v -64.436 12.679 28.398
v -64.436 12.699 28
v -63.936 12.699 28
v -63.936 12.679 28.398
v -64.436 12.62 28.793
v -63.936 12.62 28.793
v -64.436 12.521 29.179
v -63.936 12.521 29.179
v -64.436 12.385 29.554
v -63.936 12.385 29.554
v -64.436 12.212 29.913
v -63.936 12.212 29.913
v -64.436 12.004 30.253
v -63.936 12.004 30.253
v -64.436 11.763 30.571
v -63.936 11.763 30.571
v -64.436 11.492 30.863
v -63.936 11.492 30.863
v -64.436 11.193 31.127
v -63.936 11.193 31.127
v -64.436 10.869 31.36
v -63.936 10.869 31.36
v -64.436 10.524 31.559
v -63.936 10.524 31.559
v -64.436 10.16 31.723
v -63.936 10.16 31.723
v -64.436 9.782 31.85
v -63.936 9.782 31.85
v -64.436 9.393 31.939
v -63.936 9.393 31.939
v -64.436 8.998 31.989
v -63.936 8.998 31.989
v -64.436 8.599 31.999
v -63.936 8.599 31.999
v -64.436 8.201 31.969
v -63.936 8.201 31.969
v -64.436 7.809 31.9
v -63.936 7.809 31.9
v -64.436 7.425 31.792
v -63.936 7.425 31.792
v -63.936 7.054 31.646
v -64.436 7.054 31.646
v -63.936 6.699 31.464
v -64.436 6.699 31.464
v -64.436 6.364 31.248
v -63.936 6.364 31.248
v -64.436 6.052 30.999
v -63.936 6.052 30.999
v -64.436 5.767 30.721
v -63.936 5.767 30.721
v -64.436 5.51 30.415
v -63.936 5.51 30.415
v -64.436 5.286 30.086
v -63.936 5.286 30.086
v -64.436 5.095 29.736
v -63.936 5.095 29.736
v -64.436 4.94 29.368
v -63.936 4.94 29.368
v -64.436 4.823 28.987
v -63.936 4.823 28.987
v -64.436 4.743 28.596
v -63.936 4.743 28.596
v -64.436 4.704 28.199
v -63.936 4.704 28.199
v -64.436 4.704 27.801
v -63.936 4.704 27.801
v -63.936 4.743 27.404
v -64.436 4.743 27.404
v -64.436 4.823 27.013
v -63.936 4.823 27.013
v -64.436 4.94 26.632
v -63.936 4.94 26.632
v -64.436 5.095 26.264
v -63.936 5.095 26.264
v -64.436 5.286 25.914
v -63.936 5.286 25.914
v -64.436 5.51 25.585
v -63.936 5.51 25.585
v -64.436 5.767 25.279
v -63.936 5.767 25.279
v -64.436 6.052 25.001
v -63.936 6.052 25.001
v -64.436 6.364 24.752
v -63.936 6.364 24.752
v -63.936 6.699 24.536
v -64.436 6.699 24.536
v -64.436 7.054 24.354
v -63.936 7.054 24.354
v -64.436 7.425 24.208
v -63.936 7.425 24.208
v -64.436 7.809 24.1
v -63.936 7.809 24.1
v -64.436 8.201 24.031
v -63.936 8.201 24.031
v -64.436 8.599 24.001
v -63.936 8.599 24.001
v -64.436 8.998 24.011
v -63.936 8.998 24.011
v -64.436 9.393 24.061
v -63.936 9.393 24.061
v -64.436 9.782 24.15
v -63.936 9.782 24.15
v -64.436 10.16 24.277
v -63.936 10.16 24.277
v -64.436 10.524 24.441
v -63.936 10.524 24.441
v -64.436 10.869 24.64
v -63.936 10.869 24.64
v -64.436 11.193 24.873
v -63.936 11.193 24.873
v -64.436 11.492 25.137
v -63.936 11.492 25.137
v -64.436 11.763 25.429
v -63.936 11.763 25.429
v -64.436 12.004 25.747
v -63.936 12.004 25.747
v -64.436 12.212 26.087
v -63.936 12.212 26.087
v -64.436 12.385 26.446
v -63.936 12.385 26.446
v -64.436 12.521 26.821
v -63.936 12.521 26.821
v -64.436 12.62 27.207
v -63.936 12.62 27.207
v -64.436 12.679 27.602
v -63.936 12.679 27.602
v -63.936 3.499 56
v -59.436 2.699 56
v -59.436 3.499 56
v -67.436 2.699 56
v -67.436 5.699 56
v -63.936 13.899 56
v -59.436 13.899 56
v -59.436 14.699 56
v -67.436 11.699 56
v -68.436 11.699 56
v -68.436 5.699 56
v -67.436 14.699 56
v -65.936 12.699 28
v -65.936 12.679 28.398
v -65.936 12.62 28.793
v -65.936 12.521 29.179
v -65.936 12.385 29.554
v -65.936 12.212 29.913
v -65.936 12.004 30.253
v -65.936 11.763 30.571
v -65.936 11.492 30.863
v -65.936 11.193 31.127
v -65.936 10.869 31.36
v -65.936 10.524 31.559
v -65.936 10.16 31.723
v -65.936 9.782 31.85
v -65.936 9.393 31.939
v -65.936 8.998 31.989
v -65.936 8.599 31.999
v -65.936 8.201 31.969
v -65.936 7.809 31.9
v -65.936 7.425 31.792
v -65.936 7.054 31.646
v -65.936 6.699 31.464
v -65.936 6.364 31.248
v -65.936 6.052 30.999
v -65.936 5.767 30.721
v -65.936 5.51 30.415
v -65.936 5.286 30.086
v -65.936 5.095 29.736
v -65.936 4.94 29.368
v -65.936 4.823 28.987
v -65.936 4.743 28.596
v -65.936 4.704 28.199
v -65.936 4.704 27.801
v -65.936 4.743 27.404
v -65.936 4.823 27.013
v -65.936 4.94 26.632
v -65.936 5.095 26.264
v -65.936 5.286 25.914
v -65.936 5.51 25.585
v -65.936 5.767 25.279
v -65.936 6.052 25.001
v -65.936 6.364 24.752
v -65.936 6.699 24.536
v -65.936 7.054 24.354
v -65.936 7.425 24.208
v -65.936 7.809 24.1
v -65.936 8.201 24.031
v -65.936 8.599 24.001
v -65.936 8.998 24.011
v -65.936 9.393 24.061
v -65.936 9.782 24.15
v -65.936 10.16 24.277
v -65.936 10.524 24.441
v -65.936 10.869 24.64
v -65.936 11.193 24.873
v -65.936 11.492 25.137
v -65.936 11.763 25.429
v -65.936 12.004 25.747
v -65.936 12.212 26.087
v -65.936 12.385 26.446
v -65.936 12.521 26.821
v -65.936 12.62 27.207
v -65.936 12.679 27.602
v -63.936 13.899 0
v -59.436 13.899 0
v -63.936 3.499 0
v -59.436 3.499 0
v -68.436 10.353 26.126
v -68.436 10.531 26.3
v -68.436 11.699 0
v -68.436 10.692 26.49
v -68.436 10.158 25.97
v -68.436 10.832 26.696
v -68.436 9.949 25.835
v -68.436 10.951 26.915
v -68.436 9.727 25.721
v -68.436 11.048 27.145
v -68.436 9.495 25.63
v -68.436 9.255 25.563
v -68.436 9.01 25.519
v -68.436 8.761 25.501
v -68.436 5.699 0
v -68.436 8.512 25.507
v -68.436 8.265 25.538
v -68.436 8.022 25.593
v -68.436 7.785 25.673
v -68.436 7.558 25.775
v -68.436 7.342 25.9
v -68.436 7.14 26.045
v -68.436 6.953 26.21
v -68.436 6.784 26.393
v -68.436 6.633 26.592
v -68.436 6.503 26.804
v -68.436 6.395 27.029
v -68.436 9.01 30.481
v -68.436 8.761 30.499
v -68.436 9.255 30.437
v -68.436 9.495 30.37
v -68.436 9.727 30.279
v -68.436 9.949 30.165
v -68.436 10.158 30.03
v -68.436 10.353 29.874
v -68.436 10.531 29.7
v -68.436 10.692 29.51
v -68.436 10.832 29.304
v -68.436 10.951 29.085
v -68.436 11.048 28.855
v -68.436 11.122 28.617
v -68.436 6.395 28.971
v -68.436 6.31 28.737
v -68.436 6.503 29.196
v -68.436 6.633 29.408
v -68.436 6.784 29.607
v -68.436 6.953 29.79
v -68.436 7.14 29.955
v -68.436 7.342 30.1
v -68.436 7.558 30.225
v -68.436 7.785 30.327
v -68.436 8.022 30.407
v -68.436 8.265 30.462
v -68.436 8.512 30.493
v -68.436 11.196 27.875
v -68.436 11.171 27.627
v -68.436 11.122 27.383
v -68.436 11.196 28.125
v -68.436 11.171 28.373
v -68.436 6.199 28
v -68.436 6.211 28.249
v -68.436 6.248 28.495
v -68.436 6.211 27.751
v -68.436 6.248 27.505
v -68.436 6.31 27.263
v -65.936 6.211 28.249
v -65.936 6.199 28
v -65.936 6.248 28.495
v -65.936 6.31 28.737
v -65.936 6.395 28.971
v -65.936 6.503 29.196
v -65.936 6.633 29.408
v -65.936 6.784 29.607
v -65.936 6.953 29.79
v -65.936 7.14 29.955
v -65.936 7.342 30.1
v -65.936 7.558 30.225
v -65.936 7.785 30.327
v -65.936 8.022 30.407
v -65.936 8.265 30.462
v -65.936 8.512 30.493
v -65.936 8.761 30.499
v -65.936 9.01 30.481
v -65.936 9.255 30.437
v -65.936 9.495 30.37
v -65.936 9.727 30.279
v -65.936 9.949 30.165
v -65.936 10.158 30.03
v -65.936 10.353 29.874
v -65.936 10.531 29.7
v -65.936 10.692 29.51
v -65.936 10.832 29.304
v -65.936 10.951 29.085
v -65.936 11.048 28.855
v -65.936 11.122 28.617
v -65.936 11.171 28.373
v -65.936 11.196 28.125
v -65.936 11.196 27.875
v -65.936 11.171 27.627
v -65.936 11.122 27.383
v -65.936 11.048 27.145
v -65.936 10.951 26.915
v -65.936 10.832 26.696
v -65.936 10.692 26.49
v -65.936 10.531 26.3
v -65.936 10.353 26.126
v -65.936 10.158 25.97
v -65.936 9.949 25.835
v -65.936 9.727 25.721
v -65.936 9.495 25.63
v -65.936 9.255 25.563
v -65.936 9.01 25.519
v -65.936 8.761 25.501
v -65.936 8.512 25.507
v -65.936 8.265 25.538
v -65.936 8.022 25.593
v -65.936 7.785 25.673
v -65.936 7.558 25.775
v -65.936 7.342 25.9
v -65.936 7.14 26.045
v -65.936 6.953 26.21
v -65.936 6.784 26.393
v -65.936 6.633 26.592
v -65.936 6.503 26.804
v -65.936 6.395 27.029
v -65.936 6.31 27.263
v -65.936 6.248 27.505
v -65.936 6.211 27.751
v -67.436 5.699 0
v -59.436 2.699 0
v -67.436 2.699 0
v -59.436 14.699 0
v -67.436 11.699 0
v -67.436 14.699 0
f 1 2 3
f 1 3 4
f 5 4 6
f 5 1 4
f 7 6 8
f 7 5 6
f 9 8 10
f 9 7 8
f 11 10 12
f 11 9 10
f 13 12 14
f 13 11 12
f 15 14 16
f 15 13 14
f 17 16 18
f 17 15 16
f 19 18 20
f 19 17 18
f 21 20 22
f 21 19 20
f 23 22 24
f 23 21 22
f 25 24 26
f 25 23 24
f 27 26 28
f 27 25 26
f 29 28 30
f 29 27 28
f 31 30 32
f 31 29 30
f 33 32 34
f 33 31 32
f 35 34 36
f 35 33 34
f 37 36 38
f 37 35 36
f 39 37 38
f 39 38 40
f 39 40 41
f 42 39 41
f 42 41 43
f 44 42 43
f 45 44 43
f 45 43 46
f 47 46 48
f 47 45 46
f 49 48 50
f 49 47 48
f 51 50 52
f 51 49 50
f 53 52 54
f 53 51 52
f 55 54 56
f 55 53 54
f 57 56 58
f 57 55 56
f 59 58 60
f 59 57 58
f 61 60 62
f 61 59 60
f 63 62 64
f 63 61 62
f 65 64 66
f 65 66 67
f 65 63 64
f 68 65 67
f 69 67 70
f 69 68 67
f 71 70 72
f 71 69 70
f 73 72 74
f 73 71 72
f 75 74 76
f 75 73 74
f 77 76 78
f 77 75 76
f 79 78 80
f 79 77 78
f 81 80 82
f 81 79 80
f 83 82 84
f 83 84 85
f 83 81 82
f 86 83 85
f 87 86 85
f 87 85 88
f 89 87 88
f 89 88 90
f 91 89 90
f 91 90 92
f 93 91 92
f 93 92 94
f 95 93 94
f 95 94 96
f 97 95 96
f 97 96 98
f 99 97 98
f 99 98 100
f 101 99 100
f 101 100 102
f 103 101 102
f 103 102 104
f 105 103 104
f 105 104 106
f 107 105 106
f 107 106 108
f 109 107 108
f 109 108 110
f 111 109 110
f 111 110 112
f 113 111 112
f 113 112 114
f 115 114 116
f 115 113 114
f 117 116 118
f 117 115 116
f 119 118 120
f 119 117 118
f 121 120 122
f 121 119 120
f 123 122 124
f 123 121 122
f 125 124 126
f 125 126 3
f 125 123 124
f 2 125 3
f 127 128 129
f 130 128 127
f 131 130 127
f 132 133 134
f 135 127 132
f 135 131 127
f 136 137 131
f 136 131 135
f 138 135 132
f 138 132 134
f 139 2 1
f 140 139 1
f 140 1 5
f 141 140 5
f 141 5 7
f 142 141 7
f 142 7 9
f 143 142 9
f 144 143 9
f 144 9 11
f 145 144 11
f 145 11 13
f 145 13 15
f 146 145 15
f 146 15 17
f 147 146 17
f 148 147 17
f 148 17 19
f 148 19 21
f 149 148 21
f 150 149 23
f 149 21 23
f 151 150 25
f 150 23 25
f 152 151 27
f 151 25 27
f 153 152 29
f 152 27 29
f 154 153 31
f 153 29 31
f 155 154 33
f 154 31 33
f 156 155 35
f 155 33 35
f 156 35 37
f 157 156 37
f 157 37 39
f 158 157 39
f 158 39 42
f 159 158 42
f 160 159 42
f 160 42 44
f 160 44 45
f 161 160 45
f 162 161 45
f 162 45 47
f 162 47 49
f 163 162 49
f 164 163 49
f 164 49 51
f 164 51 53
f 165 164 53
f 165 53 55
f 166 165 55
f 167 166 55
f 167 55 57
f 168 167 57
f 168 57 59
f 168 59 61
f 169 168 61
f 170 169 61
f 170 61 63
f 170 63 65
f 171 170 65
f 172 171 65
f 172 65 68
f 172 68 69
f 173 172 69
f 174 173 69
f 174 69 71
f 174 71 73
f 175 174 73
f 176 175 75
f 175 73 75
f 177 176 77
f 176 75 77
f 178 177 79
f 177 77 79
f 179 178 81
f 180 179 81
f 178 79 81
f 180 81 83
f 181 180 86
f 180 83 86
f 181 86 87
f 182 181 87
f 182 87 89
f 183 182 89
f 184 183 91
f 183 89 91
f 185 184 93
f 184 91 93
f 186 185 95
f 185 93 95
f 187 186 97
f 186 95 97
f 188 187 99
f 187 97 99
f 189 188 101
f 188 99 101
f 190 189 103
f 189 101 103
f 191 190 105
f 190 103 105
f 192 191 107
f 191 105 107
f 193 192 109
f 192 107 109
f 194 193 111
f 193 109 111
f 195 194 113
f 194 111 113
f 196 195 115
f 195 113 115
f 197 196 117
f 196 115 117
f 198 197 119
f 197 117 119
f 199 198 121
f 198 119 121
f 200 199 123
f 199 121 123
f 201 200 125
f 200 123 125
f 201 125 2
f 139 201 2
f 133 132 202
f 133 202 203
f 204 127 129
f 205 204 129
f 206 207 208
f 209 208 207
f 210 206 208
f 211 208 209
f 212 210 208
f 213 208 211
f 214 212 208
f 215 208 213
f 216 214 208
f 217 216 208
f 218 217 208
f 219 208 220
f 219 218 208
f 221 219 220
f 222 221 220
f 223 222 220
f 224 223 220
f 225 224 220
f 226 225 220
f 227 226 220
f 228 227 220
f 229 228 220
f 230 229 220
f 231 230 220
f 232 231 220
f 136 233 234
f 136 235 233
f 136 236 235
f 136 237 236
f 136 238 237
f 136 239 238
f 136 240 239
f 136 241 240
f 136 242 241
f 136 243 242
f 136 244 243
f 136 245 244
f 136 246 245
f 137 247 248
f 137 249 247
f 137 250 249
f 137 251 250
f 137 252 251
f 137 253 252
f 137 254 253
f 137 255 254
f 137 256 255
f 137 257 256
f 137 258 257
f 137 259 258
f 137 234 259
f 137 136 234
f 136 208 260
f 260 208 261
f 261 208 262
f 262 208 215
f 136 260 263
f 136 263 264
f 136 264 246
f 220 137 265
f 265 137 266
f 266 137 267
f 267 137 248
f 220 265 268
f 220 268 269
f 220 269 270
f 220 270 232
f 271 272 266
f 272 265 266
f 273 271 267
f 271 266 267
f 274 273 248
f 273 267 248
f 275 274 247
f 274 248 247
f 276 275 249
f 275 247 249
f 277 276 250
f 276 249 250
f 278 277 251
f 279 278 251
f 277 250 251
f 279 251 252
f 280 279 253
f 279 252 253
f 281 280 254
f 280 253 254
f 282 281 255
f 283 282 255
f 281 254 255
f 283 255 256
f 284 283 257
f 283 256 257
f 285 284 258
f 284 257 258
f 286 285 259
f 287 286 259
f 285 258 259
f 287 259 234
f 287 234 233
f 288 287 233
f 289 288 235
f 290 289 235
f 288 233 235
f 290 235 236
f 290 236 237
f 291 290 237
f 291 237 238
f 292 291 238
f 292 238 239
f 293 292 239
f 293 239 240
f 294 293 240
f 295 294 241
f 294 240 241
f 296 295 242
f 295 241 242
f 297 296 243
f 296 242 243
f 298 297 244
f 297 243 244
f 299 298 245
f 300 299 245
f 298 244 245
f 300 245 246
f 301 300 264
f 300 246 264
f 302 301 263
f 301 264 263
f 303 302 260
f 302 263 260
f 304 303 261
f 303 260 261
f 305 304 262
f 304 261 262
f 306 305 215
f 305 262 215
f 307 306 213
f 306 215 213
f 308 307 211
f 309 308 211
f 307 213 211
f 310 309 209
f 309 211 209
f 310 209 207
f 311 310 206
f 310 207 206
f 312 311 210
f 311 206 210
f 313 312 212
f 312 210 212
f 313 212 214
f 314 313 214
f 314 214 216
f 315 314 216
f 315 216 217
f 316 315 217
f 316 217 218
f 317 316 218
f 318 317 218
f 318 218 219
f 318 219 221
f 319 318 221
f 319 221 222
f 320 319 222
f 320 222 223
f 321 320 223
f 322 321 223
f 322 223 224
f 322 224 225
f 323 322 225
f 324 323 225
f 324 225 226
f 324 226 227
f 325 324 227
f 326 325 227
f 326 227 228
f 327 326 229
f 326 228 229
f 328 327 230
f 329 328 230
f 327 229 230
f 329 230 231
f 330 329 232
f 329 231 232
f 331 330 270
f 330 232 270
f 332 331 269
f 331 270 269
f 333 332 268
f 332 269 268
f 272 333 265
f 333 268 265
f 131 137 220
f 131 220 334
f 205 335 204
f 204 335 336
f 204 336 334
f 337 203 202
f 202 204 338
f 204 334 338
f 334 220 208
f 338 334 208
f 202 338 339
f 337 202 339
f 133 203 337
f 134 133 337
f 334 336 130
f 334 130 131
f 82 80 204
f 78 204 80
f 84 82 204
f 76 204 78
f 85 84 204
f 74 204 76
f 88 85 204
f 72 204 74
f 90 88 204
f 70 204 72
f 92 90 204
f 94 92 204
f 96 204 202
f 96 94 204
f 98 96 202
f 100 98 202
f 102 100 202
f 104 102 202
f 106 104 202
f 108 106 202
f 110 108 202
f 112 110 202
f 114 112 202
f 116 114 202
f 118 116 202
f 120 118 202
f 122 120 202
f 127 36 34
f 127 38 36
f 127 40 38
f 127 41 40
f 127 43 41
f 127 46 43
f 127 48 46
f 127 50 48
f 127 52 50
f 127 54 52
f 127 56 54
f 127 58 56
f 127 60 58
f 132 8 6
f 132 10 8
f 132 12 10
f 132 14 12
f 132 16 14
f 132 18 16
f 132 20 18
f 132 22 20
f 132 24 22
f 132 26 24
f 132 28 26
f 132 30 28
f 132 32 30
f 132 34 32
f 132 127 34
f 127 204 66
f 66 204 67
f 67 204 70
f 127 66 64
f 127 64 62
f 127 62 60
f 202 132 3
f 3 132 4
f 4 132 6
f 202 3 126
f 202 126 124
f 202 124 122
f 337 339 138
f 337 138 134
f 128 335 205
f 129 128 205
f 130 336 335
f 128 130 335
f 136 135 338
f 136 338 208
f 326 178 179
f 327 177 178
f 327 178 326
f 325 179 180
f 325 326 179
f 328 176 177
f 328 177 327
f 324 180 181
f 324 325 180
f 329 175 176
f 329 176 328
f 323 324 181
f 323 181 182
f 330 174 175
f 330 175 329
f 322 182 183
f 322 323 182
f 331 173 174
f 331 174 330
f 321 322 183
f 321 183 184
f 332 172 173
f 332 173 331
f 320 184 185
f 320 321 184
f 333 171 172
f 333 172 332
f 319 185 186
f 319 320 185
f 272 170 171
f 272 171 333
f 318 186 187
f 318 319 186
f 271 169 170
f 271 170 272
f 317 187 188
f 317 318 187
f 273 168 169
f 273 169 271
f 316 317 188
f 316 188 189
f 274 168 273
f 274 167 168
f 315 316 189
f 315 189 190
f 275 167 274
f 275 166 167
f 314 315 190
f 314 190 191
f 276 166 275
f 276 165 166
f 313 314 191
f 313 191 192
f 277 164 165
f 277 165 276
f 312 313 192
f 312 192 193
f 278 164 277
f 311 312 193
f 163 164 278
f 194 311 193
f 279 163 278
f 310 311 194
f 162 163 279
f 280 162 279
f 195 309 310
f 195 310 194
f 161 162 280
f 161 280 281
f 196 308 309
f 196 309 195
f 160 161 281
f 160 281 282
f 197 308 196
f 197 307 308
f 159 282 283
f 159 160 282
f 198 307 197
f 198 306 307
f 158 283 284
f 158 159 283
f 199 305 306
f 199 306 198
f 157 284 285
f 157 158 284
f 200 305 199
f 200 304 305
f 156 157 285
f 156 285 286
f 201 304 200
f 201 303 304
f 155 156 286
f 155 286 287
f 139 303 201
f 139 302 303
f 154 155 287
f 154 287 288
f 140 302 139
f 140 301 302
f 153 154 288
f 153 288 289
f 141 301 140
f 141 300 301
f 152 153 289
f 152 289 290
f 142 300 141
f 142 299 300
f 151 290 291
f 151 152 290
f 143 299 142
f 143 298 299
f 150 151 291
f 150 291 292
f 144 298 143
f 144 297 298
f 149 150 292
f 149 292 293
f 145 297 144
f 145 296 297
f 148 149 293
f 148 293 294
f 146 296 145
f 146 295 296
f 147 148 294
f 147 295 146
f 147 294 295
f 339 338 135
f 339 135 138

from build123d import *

# Parameters (mm, degrees)
F0_W           = 8
F0_H           = 12
F1_DEPTH       = 56
F2_W           = 5
F2_H           = 10.4
F3_DEPTH       = 56
F5_DEPTH       = 56
F7_D           = 5
F7_DEPTH       = 34
F7_CBORE_D     = 8
F7_CBORE_DEPTH = 1.5
F7_TIP         = 1.5021515476
F8_DEPTH       = 0.5


with BuildPart() as f1:
    # F0 (on Top) → F1 (new body)
    with BuildSketch(Plane.XY):
        with Locations((-63.4363747239, 8.6988127381)):
            Rectangle(F0_W, F0_H)
    extrude(amount=F1_DEPTH)

    # F2 (on face) → F3 (cut)
    with BuildSketch(Plane.XY.offset(56)):
        with Locations((-61.9363747239, 8.6988127381)):
            Rectangle(F2_W, F2_H)
    extrude(amount=-F3_DEPTH, mode=Mode.SUBTRACT)

    # F4 (on face) → F5 (join)
    with BuildSketch(Plane.XY.offset(56)):
        Polygon((-67.4363747239, 5.6988127381), (-67.4363747239, 8.6988127381), (-67.4363747239, 11.6988127381), (-68.4363747239, 11.6988127381), (-68.4363747239, 5.6988127381), align=None)
    extrude(amount=-F5_DEPTH)

    # F7
    with Locations(Plane.YZ.offset(-64.4363747239)):
        with Locations((8.6988127381, 28)):
            CounterBoreHole(F7_D / 2, F7_CBORE_D / 2, F7_CBORE_DEPTH, depth=F7_DEPTH)
            with Locations((0, 0, -(F7_DEPTH + F7_TIP / 2))):  # 118° drill point
                Cone(0, F7_D / 2, F7_TIP, mode=Mode.SUBTRACT)

    # F8 (add): a face of the model
    f8_faces = [f1.faces().sort_by_distance(p)[0] for p in [
        (-64.4363747239, 13.3292374577, 28),
    ]]
    extrude(f8_faces, amount=F8_DEPTH)


solid = f1.part
